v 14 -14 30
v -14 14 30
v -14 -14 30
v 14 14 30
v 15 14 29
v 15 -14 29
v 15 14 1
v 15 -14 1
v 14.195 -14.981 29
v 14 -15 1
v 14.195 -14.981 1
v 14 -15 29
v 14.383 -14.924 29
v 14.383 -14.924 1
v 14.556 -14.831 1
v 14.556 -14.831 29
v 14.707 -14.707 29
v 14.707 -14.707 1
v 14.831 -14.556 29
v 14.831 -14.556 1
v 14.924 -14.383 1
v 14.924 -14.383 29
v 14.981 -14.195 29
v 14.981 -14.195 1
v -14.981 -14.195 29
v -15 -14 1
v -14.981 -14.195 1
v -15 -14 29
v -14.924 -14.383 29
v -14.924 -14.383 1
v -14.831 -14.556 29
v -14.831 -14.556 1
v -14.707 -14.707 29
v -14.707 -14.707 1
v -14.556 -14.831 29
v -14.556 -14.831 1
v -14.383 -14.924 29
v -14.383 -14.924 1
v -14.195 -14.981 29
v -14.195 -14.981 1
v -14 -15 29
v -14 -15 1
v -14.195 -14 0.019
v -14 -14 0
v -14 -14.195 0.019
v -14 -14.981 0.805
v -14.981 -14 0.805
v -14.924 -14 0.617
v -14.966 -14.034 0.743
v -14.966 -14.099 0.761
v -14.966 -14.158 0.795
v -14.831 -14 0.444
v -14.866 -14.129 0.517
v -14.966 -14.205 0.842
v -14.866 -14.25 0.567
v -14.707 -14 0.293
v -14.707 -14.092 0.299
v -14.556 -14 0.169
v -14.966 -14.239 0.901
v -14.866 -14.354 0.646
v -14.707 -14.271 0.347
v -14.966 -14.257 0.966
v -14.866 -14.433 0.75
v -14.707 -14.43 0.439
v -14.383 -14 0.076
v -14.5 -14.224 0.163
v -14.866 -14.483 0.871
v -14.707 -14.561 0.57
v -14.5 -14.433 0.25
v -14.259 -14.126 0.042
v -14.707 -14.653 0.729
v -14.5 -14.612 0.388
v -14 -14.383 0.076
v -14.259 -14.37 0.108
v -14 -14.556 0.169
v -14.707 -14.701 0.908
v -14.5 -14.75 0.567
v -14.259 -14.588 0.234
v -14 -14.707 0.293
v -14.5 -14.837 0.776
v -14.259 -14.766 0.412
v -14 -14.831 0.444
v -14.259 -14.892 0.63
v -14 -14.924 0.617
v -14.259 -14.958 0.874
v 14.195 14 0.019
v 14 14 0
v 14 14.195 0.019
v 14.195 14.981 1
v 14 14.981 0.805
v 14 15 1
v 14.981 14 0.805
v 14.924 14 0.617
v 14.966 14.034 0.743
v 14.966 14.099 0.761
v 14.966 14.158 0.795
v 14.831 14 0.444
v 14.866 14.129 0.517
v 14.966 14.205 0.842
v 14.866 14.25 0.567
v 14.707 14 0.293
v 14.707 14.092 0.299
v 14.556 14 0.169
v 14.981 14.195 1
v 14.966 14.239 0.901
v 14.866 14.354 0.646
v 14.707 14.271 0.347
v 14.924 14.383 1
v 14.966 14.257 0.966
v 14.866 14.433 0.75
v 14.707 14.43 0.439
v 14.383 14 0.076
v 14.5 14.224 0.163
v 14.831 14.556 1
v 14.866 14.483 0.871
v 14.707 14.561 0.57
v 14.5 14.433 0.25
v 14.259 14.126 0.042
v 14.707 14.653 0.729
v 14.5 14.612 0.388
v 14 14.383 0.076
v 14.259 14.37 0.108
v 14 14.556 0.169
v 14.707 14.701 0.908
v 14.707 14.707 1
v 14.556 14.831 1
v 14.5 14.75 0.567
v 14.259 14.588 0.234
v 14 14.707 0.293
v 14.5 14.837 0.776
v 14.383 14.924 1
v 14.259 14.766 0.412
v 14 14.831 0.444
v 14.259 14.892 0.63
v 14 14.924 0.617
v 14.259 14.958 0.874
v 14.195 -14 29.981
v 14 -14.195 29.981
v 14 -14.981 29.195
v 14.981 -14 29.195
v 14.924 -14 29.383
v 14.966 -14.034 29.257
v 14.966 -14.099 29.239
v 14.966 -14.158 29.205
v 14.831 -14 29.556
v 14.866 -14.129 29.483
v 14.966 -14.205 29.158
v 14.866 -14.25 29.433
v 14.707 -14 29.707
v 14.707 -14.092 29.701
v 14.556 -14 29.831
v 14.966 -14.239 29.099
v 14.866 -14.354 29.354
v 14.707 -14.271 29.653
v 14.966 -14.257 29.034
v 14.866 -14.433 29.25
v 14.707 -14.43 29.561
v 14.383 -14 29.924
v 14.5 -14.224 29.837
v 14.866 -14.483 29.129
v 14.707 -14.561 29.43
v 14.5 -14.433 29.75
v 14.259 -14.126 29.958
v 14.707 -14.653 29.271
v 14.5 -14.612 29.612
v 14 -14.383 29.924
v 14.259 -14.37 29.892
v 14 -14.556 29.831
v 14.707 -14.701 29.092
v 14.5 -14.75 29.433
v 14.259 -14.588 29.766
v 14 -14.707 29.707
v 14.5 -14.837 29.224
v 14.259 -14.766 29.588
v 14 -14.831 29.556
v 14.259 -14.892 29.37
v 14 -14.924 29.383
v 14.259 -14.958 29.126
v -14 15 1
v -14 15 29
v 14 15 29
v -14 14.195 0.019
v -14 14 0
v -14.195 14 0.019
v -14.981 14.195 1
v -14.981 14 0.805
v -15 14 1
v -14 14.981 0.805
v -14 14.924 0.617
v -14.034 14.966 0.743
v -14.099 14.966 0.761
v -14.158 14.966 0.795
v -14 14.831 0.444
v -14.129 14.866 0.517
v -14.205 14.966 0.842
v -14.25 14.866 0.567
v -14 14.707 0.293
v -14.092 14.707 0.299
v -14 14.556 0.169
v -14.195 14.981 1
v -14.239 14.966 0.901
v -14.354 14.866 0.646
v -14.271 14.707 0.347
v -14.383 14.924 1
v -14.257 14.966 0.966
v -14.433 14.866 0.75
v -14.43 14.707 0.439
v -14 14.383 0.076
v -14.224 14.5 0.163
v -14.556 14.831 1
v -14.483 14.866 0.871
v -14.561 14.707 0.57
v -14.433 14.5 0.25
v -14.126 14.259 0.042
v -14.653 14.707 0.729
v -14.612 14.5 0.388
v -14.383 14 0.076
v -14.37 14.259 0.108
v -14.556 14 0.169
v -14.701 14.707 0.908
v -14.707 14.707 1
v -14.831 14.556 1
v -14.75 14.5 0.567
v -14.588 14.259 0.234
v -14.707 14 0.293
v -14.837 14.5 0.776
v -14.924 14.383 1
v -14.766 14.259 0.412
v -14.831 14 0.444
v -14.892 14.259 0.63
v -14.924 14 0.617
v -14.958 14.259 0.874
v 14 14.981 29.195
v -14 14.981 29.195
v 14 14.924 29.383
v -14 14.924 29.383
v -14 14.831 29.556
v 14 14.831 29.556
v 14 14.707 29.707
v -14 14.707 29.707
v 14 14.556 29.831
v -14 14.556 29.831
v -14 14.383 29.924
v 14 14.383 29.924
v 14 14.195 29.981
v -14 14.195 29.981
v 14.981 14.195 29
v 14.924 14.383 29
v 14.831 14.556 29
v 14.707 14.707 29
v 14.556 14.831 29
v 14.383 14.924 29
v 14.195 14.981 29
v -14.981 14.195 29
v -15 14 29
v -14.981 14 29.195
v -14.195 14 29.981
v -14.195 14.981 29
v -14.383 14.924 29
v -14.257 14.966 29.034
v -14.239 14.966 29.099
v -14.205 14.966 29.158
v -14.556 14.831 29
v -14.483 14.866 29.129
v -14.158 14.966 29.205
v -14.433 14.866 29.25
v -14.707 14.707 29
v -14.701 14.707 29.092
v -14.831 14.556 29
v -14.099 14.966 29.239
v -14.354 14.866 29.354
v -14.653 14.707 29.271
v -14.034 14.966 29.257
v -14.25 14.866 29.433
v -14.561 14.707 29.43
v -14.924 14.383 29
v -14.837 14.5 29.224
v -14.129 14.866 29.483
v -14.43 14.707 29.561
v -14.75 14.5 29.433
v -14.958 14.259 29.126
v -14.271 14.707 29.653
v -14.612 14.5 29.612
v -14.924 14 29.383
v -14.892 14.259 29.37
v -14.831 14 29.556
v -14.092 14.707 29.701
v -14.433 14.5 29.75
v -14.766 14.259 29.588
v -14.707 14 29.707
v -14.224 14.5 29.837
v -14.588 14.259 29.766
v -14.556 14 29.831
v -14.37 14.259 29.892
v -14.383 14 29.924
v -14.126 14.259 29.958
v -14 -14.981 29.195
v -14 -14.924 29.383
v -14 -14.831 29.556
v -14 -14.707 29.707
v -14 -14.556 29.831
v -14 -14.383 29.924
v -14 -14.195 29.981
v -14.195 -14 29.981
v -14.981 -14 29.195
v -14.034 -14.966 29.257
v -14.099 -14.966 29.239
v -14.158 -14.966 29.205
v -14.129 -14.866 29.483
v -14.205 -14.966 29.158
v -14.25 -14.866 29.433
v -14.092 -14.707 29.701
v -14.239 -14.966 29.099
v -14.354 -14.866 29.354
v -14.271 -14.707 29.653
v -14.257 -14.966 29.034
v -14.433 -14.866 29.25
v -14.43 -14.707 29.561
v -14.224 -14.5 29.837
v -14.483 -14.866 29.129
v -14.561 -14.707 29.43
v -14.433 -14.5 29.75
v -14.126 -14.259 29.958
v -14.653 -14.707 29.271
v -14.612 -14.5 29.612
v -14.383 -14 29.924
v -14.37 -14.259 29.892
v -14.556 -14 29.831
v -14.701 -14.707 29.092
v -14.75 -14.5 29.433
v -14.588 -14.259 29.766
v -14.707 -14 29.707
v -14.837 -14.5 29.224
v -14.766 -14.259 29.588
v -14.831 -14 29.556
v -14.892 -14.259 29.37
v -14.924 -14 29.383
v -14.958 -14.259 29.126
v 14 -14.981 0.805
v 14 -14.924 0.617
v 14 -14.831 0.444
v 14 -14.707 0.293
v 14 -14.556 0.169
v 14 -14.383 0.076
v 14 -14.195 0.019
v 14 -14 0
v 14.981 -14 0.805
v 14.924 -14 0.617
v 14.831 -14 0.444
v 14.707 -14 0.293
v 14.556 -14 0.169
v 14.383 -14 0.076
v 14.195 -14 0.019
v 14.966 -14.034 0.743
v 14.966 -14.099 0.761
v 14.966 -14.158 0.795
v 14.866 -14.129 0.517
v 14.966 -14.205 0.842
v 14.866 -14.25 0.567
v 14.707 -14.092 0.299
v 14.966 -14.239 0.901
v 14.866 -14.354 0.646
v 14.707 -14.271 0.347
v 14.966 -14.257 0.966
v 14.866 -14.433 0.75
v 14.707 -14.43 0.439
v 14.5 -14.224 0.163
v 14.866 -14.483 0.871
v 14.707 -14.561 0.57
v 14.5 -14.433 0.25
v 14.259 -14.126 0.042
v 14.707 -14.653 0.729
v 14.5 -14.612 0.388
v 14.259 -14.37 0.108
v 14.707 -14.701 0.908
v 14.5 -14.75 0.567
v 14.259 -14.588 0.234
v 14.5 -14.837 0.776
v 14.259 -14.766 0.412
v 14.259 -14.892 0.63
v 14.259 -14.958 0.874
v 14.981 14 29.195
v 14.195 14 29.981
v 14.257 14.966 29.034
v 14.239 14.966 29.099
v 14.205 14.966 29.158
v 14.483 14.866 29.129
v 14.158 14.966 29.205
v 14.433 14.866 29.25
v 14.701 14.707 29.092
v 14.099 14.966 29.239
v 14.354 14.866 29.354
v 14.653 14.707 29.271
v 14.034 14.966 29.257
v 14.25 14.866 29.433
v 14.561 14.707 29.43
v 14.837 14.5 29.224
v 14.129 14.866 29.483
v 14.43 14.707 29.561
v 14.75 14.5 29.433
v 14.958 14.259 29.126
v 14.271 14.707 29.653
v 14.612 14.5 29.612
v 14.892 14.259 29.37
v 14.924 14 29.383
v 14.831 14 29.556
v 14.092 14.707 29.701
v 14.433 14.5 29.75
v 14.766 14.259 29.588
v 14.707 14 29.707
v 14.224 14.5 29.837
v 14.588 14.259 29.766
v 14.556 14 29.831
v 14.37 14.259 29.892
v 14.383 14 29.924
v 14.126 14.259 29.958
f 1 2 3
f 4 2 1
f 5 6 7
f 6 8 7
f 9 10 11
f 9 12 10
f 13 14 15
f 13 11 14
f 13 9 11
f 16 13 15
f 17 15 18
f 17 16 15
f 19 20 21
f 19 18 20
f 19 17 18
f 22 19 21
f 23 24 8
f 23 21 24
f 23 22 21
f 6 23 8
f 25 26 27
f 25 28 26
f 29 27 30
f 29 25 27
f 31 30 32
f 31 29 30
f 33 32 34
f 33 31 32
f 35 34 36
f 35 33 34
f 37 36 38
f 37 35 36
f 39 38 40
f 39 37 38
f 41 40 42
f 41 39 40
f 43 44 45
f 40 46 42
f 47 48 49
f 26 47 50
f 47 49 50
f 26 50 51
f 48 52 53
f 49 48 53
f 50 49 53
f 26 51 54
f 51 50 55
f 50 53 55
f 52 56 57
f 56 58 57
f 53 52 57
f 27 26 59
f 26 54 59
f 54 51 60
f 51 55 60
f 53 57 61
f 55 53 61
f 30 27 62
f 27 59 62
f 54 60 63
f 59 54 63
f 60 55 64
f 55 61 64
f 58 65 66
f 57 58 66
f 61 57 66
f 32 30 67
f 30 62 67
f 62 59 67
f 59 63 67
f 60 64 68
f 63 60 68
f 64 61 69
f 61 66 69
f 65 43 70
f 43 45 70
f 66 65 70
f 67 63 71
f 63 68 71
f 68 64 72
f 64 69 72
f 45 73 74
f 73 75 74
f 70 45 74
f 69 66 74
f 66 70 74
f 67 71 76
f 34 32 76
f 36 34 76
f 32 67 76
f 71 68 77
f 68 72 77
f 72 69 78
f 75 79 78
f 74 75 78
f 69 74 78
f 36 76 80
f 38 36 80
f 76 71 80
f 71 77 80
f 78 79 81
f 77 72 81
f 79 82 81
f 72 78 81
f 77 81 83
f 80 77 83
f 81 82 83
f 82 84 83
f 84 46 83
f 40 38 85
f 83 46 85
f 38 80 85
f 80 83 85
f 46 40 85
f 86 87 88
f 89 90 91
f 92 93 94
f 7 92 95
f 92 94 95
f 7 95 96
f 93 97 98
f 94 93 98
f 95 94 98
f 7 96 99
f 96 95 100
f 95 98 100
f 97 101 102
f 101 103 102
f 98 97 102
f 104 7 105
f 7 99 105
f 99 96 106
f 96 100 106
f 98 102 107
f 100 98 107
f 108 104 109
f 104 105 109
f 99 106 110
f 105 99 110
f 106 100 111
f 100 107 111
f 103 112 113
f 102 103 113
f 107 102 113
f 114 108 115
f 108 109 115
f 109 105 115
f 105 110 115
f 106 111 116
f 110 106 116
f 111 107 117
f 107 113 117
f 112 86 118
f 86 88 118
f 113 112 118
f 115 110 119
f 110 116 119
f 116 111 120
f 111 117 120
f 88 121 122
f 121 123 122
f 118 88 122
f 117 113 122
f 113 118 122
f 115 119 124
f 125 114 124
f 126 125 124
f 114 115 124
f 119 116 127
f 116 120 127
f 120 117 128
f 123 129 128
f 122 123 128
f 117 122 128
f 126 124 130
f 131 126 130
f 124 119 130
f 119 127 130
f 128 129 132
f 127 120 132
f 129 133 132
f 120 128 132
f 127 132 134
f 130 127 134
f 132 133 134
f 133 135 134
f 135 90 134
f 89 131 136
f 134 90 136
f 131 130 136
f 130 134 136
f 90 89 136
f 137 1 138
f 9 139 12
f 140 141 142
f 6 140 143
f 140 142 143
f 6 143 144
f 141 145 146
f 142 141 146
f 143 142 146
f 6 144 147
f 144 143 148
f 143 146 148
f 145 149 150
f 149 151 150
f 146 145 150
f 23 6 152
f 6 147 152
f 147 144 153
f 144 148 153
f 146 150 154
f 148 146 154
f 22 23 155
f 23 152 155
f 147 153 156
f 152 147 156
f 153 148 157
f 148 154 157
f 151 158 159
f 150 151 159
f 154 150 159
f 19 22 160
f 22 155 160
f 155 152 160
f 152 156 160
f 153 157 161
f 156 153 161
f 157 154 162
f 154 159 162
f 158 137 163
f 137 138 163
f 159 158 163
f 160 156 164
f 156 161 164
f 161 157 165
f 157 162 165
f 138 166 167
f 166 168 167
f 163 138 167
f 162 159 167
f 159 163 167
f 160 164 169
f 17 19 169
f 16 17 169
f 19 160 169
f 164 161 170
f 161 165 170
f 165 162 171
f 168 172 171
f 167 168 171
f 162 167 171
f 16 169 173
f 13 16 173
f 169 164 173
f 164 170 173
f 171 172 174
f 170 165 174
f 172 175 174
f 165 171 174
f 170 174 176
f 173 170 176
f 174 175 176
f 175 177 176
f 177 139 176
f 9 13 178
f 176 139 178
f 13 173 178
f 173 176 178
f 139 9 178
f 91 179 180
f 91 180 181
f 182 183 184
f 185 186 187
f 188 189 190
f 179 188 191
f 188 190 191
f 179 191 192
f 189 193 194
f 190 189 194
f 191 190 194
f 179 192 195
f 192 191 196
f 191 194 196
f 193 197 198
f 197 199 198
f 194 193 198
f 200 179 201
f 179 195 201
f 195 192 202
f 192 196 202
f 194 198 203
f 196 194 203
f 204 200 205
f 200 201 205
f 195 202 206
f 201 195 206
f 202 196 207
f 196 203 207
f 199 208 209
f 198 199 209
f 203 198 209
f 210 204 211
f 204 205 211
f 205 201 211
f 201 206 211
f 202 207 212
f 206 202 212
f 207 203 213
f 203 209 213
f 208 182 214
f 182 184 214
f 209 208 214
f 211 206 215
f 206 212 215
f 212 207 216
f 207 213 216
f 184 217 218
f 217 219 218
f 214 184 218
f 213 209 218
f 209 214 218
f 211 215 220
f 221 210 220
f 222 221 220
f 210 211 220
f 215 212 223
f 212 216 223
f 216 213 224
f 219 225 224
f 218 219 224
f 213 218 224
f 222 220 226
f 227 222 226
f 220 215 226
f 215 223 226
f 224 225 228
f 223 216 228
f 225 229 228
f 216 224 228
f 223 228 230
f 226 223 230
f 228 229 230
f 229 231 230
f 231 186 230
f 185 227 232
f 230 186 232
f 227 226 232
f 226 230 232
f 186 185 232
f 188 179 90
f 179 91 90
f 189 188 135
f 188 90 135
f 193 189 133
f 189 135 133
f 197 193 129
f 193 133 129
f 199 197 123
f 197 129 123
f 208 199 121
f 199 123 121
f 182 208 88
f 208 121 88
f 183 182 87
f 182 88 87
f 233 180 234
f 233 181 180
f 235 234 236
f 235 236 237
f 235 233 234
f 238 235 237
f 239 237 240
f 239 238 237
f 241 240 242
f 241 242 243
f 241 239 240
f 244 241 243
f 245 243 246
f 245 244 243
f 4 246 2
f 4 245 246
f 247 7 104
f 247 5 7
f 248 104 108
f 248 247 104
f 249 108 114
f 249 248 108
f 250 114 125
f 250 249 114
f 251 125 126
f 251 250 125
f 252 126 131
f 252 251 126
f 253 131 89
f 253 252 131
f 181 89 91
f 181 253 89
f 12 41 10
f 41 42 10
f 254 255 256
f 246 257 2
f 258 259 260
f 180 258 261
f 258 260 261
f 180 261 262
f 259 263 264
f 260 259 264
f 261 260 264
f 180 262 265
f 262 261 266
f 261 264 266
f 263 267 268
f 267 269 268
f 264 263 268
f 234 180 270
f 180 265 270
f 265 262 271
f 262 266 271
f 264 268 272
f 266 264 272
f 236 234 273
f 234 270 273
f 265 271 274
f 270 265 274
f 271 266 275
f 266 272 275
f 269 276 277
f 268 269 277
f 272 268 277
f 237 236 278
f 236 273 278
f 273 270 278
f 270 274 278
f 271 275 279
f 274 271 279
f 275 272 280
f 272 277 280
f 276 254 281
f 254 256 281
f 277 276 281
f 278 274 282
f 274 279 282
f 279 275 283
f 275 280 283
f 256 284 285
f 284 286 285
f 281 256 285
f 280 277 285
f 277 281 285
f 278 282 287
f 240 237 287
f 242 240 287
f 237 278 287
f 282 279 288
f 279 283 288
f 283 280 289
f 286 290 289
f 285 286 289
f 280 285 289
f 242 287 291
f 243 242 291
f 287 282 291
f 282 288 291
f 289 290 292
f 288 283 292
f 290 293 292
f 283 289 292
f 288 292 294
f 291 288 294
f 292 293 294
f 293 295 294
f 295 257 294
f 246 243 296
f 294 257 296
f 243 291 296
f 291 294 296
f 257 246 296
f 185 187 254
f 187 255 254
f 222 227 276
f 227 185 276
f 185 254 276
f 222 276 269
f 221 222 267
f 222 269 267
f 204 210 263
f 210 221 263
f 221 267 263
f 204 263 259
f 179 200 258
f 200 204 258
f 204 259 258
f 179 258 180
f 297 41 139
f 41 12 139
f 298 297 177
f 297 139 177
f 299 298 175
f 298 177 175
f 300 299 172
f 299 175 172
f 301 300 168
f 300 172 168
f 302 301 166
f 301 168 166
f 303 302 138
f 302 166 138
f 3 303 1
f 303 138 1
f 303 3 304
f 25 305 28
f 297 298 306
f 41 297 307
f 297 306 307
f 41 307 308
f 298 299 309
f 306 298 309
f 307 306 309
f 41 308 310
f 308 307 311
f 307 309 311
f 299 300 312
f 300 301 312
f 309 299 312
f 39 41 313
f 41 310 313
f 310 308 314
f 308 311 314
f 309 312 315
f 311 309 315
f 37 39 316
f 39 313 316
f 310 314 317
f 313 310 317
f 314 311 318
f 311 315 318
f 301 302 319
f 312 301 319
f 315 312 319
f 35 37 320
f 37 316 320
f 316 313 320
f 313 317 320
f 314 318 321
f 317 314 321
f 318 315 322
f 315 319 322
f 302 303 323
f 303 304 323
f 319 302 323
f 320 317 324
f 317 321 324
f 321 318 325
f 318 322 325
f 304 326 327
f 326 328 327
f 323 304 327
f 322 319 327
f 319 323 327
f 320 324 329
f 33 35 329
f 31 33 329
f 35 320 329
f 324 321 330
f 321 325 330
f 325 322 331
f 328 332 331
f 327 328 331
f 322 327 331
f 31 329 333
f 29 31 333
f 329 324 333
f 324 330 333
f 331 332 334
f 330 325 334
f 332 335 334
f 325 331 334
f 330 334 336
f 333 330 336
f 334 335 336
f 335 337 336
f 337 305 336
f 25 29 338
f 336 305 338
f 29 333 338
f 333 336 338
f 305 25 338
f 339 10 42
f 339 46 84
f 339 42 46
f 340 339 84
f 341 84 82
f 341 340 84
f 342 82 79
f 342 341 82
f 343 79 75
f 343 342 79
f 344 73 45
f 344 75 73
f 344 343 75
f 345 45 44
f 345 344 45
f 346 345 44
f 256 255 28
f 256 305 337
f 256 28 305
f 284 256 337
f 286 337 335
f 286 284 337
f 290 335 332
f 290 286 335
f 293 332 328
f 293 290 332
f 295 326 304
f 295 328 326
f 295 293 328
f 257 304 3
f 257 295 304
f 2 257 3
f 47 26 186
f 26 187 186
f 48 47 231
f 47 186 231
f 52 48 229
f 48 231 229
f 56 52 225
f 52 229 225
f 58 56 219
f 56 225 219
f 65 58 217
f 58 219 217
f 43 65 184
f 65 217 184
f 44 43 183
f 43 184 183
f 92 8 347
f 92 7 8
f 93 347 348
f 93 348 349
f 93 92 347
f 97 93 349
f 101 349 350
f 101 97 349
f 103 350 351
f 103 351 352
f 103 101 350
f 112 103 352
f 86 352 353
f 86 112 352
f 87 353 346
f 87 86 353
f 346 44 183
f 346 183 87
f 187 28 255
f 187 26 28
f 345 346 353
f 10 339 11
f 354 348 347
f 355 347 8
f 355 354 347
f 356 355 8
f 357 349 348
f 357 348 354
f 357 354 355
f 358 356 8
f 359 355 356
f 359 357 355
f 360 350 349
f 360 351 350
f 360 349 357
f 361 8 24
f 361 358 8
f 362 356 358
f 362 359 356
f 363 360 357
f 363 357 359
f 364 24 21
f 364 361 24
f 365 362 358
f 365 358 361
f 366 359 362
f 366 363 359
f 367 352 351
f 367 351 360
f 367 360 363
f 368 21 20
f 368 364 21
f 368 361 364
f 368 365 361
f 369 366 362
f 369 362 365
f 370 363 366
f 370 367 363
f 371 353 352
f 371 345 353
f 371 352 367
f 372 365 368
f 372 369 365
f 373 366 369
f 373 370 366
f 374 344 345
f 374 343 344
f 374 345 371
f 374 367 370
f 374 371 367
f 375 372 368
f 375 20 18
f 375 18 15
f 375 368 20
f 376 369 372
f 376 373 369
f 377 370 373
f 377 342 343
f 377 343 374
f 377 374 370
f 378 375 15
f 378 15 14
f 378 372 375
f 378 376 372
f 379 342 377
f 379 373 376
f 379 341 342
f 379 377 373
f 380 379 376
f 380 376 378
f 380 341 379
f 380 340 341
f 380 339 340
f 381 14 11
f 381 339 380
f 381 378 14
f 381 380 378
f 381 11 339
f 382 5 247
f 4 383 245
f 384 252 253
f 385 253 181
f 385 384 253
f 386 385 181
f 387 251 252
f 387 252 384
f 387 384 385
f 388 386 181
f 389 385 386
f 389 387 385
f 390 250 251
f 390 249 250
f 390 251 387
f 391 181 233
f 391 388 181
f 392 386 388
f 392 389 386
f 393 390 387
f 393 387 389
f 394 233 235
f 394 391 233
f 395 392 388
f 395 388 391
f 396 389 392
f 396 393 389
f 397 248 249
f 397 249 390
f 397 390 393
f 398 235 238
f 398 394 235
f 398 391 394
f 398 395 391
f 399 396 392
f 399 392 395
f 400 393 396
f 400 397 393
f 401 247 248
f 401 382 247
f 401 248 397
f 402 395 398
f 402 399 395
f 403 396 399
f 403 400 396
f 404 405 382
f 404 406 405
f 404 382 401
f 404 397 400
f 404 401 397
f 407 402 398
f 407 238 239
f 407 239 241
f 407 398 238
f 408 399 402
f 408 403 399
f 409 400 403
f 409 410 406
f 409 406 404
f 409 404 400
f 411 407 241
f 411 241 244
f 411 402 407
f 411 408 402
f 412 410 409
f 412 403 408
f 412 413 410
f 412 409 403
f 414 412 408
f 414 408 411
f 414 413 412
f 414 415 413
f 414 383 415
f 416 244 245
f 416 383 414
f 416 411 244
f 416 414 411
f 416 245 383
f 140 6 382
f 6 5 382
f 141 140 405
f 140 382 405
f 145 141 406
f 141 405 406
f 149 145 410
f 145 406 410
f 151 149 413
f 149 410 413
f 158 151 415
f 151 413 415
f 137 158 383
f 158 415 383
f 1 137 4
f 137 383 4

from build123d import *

# Parameters (mm, degrees)
ESQUISSE1_W        = 30
ESQUISSE1_H        = 30
BOSS_EXTRU_1_DEPTH = 30
CONG_1_R           = 1


with BuildPart() as part:
    # Esquisse1 → Boss.-Extru.1 (new body)
    with BuildSketch(Plane.XY):
        Rectangle(ESQUISSE1_W, ESQUISSE1_H)
    extrude(amount=BOSS_EXTRU_1_DEPTH)

    # Congé1
    cong_1_edges = [part.edges().sort_by_distance(p)[0] for p in [
        (-15, 0, 30),
        (0, -15, 30),
        (15, 0, 30),
        (0, -15, 0),
        (-15, 0, 0),
        (0, 15, 0),
        (15, 0, 0),
        (15, -15, 15),
        (-15, -15, 15),
        (-15, 15, 15),
        (15, 15, 15),
        (0, 15, 30),
    ]]
    fillet(cong_1_edges, radius=CONG_1_R)


solid = part.part
